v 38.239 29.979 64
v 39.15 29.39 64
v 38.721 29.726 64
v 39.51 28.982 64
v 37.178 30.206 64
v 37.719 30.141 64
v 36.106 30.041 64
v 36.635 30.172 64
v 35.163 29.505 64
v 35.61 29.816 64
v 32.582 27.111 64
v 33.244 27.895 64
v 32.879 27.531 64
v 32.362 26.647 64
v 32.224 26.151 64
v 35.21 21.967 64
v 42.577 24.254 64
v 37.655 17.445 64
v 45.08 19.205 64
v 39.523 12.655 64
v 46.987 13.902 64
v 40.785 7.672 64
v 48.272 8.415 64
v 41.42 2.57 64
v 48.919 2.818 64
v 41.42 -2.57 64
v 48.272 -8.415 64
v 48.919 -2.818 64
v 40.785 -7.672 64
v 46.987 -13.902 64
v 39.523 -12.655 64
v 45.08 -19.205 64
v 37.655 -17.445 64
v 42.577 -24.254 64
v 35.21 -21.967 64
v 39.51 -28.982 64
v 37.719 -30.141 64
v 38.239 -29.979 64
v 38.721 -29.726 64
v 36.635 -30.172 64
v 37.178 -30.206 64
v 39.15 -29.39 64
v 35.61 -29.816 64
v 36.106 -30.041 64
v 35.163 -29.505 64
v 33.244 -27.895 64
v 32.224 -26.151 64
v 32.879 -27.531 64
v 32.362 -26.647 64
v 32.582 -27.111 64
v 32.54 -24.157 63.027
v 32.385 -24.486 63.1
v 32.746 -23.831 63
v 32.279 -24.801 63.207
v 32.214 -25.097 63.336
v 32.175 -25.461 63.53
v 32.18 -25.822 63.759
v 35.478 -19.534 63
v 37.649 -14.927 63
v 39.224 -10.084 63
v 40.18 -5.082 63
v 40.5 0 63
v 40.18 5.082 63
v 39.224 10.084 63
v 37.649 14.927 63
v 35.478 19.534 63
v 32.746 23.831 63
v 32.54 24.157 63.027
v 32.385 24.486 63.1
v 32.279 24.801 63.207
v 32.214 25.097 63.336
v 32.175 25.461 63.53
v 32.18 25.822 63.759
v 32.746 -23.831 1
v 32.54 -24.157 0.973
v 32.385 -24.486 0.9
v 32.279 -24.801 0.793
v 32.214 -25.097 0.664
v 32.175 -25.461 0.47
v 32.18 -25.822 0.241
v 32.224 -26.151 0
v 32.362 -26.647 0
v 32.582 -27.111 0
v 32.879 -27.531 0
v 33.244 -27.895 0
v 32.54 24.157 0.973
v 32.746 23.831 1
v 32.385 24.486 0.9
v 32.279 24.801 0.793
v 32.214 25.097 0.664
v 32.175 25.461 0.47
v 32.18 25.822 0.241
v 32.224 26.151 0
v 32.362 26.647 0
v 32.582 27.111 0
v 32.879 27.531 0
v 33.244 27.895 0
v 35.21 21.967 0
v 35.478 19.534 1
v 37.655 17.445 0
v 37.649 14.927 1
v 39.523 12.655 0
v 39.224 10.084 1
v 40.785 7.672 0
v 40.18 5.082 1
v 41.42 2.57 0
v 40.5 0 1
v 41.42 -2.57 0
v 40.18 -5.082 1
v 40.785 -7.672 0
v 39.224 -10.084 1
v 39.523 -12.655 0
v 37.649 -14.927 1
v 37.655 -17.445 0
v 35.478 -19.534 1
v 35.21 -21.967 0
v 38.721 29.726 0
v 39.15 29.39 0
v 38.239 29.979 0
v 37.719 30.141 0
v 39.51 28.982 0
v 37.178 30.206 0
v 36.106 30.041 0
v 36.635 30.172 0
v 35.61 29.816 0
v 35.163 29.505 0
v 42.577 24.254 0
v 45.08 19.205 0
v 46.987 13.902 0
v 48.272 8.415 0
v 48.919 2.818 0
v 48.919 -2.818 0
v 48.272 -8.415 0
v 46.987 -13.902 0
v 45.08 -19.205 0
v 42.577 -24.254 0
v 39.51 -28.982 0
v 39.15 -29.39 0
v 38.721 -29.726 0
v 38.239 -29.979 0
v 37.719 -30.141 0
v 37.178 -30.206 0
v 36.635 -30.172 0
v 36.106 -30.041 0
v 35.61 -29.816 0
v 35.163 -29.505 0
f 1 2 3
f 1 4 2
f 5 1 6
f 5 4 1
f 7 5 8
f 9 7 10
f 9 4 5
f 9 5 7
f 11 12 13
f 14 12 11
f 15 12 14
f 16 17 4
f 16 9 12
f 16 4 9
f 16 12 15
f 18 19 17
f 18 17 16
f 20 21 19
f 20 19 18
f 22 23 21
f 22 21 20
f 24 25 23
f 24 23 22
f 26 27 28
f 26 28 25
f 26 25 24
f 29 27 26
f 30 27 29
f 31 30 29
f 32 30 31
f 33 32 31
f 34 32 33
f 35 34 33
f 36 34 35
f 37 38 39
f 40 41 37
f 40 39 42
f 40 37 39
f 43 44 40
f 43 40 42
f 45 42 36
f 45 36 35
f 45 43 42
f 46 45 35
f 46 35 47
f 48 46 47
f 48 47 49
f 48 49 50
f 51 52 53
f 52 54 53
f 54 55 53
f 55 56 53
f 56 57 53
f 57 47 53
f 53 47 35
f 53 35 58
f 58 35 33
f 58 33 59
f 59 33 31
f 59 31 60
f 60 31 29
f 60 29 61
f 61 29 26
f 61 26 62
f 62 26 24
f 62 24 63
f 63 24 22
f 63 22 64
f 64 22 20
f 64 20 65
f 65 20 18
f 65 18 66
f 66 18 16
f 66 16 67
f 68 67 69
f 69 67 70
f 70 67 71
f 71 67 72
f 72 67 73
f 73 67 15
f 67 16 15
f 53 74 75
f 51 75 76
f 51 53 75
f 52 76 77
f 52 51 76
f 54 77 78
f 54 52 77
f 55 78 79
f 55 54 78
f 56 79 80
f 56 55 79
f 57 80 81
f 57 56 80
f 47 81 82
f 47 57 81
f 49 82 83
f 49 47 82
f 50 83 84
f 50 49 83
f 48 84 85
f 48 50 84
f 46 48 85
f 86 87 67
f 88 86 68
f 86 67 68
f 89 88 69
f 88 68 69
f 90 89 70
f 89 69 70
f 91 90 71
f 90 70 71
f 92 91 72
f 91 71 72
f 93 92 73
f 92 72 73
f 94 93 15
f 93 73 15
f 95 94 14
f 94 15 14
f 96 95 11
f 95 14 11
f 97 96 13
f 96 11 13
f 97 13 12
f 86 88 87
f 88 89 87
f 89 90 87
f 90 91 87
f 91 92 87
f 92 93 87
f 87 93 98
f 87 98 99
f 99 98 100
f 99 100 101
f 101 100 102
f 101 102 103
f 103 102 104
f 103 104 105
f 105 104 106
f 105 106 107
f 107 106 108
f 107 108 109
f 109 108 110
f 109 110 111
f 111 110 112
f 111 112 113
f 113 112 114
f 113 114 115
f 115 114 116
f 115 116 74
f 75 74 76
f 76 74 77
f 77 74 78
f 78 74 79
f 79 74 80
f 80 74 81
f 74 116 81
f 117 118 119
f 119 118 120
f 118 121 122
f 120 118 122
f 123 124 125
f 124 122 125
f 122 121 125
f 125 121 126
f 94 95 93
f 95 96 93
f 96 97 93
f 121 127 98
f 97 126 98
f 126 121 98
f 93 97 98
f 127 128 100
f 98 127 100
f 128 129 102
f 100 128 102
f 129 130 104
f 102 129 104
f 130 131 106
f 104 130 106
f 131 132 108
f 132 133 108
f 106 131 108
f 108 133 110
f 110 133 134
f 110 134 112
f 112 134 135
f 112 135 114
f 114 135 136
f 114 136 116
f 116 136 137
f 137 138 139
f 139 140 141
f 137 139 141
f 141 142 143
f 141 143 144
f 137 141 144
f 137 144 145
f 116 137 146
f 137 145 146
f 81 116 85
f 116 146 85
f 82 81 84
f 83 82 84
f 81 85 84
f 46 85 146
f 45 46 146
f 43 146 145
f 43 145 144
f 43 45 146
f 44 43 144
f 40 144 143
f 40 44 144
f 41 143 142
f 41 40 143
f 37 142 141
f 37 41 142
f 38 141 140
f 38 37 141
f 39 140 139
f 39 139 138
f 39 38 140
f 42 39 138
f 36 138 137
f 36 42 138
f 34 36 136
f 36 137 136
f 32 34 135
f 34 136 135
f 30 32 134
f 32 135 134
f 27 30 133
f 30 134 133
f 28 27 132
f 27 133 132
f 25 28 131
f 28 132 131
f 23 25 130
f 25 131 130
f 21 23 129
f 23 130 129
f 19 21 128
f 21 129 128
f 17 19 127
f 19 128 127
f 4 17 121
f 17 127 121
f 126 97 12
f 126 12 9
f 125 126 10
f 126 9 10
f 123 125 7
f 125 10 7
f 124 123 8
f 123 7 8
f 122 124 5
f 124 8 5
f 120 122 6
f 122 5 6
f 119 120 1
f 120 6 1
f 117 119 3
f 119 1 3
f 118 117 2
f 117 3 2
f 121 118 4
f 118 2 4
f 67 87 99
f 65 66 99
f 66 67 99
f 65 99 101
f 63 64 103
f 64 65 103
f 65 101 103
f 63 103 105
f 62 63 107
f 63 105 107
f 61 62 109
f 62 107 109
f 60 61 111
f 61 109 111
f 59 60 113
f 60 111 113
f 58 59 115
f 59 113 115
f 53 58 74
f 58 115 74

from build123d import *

# Parameters (mm, degrees)
EXTRUSION1_DEPTH = 64
CHANFREIN1_SIZE  = 1
CONG_1_R         = 3


with BuildPart() as part:
    # Esquisse1 → Extrusion1 (new body)
    with BuildSketch(Plane.XY):
        with BuildLine():
            Line((49, 0), (40.5, 0))
            ThreePointArc((40.5, 0), (38.05755114182933, 13.851815804689483), (31.024799946318748, 26.032898192304682))
            Line((31.024799946318748, 26.032898192304682), (37.53617771283009, 31.496592874640232))
            ThreePointArc((37.53617771283009, 31.496592874640232), (46.04493841850956, 16.758987022957648), (49, 0))
        make_face()
    extrusion1 = extrude(amount=EXTRUSION1_DEPTH)

    # Symétrie1: Extrusion1 across plane
    add(extrusion1.mirror(Plane(origin=(49, 0, 64), x_dir=(0, 0, 1), z_dir=(0, 1, 0))))

    # Chanfrein1
    chanfrein1_edges = [part.edges().sort_by_distance(p)[0] for p in [
        (40.50000000000001, 3.55e-15, 64),
        (40.50000000000001, -3.55e-15, 0),
    ]]
    chamfer(chanfrein1_edges, length=CHANFREIN1_SIZE)

    # Congé1
    cong_1_edges = [part.edges().sort_by_distance(p)[0] for p in [
        (31.02479994631875, 26.032898192304682, 32),
        (37.536177712830096, 31.496592874640232, 32),
        (37.536177712830096, -31.496592874640232, 32),
        (31.02479994631875, -26.032898192304682, 32),
    ]]
    fillet(cong_1_edges, radius=CONG_1_R)


solid = part.part
